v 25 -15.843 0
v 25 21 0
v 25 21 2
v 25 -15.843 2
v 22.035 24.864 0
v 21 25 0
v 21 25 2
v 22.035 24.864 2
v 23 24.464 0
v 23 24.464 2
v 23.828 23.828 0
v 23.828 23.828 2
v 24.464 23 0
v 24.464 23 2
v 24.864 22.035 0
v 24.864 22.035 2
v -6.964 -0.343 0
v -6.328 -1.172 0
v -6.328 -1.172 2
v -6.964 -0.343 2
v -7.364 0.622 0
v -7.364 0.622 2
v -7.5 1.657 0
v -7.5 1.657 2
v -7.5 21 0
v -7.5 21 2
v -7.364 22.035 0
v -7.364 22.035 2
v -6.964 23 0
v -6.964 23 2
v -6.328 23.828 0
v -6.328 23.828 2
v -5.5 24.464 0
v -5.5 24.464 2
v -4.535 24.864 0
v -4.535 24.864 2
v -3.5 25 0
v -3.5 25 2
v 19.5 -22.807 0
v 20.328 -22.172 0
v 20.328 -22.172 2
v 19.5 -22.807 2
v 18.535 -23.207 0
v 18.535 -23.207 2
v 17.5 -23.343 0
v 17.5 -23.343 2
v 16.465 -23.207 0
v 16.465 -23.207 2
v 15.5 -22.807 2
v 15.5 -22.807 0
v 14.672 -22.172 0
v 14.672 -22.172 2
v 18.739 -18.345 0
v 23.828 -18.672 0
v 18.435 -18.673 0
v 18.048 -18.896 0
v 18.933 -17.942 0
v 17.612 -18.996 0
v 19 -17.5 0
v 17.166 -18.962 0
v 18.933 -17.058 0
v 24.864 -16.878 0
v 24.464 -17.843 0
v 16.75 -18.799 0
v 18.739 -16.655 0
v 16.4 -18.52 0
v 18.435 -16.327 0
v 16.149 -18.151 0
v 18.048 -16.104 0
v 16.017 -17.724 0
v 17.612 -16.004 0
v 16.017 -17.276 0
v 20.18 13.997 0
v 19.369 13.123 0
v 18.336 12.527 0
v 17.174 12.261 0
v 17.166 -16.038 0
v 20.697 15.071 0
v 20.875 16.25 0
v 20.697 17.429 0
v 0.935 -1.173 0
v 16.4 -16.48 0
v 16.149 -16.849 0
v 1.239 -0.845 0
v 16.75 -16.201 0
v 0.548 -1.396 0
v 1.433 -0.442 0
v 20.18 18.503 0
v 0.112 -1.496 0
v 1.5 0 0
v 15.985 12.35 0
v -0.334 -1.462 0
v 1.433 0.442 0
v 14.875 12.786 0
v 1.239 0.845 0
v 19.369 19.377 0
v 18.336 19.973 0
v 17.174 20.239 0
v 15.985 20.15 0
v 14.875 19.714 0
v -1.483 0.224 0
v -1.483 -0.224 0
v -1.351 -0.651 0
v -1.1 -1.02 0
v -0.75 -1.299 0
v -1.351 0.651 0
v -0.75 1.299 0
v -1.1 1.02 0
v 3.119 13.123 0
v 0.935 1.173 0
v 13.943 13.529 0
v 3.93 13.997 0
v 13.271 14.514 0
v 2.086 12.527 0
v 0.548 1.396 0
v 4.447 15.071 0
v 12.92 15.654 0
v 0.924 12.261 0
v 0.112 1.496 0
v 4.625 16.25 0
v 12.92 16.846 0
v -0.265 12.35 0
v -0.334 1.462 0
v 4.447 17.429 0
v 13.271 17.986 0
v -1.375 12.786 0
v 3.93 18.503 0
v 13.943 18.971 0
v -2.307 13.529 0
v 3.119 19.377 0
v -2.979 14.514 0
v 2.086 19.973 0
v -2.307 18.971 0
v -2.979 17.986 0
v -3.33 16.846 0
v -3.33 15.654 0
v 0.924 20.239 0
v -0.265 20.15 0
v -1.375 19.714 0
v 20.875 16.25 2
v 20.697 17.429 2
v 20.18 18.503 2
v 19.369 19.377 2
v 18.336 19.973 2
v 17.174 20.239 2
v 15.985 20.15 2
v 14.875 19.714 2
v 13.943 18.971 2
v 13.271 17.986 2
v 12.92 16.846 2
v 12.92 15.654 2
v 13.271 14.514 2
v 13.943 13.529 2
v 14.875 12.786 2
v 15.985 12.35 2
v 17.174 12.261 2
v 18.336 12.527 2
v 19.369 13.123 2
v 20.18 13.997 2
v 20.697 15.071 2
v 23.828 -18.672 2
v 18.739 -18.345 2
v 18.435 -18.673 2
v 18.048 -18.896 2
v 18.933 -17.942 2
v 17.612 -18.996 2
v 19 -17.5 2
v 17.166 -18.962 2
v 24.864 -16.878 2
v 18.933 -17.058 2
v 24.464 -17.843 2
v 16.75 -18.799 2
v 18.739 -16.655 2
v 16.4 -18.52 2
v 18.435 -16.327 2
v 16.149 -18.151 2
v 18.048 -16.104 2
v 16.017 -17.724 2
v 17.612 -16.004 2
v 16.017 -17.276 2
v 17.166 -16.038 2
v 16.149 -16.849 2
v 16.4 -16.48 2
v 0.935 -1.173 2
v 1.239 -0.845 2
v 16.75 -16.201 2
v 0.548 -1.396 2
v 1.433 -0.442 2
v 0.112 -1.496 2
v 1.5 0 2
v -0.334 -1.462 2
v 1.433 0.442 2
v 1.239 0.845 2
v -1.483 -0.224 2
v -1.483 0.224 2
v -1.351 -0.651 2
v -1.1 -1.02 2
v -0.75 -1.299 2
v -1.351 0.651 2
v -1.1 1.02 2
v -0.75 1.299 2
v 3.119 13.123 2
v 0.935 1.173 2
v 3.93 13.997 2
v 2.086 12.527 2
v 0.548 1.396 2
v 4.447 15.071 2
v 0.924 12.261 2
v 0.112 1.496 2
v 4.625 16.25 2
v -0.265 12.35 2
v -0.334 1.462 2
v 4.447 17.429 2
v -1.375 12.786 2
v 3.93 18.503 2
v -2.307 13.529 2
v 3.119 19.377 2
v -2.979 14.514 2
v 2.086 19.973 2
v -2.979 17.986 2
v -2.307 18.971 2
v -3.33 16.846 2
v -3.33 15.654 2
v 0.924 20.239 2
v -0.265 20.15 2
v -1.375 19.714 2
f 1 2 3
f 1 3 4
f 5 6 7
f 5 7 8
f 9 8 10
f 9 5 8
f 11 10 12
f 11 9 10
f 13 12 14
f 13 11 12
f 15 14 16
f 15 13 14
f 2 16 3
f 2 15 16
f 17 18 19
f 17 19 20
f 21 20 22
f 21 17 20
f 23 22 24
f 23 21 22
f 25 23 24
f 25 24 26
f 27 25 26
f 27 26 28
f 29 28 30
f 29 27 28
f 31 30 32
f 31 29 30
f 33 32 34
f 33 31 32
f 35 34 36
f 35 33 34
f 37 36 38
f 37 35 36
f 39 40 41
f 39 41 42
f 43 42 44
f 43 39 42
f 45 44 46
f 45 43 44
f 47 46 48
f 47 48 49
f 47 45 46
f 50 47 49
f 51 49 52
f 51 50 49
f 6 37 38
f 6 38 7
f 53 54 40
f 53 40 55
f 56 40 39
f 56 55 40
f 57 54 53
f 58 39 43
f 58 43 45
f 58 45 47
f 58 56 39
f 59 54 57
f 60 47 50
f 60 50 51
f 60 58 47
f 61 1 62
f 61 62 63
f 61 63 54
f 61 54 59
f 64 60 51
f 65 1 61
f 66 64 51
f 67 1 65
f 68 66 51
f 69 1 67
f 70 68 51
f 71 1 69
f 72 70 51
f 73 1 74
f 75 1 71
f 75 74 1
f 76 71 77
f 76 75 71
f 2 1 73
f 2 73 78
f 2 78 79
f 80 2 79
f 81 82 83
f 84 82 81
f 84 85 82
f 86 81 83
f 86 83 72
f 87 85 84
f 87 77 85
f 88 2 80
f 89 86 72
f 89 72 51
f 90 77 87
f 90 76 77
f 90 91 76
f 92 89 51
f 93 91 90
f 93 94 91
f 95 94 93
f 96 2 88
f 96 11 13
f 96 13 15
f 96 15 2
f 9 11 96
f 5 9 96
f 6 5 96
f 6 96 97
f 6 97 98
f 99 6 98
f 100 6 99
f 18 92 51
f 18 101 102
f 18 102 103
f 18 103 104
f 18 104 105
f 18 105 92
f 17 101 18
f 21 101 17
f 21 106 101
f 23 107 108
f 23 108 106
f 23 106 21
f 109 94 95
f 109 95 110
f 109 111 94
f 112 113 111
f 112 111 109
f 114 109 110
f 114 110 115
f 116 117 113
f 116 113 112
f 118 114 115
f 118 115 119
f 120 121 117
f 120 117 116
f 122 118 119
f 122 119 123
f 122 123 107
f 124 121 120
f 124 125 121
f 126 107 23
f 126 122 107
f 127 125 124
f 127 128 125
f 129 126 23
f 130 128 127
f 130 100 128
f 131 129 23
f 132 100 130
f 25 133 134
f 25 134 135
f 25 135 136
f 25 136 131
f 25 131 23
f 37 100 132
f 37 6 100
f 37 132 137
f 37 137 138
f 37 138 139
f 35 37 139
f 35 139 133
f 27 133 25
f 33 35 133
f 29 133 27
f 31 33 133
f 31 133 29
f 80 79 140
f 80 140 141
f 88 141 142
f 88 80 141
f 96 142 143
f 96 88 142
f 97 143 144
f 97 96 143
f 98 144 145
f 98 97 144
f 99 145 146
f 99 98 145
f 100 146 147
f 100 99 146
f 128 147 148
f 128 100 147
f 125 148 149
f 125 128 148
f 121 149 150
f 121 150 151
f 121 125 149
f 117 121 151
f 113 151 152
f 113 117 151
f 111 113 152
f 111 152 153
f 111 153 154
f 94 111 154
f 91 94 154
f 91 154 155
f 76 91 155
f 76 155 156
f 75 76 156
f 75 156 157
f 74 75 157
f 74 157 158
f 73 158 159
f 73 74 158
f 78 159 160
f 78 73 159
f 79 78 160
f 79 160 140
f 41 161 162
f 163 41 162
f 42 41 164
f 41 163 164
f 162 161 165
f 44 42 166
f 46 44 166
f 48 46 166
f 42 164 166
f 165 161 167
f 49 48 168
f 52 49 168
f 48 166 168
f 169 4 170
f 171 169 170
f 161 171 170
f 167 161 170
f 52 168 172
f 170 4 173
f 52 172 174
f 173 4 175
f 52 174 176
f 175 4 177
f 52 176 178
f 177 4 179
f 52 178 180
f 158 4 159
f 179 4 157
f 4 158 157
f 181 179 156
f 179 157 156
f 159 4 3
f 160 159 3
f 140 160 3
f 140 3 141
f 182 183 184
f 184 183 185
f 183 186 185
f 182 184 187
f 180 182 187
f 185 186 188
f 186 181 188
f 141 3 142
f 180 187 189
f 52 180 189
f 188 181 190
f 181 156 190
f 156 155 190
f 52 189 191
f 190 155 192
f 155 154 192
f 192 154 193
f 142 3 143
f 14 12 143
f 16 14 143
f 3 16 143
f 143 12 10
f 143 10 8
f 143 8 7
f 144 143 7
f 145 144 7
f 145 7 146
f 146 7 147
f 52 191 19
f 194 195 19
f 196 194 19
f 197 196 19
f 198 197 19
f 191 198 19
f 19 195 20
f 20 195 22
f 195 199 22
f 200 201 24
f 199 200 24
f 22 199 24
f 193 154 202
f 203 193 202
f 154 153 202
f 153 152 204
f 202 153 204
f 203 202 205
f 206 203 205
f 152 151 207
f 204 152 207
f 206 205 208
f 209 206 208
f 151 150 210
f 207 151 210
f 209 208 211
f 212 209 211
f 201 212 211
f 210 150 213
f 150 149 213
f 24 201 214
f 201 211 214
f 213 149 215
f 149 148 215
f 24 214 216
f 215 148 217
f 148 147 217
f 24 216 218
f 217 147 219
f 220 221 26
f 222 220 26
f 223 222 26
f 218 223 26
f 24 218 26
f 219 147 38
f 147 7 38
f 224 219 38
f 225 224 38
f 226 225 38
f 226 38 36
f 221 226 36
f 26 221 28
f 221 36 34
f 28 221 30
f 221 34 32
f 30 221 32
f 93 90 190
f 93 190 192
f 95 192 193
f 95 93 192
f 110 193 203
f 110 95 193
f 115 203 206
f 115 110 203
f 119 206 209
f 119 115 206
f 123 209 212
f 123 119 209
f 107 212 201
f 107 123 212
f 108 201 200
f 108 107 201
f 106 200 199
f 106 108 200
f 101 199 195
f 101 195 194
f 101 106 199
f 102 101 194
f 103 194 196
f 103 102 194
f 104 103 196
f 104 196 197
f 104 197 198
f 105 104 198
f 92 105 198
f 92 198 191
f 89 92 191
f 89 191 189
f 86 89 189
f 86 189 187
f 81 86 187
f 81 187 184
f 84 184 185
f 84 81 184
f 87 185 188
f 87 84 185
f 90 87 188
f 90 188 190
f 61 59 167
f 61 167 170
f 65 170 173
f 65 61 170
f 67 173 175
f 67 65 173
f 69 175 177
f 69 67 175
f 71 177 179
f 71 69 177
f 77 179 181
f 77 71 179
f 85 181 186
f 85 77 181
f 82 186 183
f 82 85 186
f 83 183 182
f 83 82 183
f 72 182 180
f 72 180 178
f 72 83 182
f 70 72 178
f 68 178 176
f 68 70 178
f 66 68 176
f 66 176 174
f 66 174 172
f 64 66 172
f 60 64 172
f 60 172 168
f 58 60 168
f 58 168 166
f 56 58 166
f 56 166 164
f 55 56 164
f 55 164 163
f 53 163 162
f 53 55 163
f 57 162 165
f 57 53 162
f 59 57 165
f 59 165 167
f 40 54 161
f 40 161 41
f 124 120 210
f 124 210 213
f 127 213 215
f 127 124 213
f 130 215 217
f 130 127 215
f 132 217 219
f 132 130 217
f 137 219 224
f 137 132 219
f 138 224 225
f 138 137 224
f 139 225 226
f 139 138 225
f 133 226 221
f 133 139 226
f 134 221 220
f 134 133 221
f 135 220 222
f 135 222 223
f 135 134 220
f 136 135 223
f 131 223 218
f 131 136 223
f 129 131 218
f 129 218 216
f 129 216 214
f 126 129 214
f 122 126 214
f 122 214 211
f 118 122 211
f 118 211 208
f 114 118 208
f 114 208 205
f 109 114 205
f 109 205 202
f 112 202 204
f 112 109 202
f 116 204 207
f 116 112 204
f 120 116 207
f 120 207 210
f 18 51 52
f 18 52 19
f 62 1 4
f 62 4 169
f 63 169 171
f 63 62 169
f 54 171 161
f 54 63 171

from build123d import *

# Parameters (mm, degrees)
CROQUIS1_R              = 1.5
CROQUIS1_R_2            = 4
SALIENTE_EXTRUIR1_DEPTH = 2


with BuildPart() as part:
    # Croquis1 → Saliente-Extruir1 (new body)
    with BuildSketch(Plane.XY):
        with BuildLine():
            Line((23.828427125, -18.671572875), (20.328427125, -22.171572875))
            ThreePointArc((20.328427125, -22.171572875), (17.5, -23.343145751), (14.671572875, -22.171572875))
            Line((14.671572875, -22.171572875), (-6.328427125, -1.171572875))
            ThreePointArc((-6.328427125, -1.171572875), (-7.19551813, 0.12612052), (-7.5, 1.656854249))
            Line((-7.5, 1.656854249), (-7.5, 21))
            ThreePointArc((-7.5, 21), (-6.328427125, 23.828427125), (-3.5, 25))
            Line((-3.5, 25), (21, 25))
            ThreePointArc((21, 25), (23.828427125, 23.828427125), (25, 21))
            Line((25, 21), (25, -15.843145751))
            ThreePointArc((25, -15.843145751), (24.69551813, -17.37387948), (23.828427125, -18.671572875))
        make_face()
        Circle(CROQUIS1_R, mode=Mode.SUBTRACT)
        with Locations((17.5, -17.5)):
            Circle(CROQUIS1_R, mode=Mode.SUBTRACT)
        with Locations((0.625, 16.25)):
            Circle(CROQUIS1_R_2, mode=Mode.SUBTRACT)
        with Locations((16.875, 16.25)):
            Circle(CROQUIS1_R_2, mode=Mode.SUBTRACT)
    extrude(amount=SALIENTE_EXTRUIR1_DEPTH)


solid = part.part
